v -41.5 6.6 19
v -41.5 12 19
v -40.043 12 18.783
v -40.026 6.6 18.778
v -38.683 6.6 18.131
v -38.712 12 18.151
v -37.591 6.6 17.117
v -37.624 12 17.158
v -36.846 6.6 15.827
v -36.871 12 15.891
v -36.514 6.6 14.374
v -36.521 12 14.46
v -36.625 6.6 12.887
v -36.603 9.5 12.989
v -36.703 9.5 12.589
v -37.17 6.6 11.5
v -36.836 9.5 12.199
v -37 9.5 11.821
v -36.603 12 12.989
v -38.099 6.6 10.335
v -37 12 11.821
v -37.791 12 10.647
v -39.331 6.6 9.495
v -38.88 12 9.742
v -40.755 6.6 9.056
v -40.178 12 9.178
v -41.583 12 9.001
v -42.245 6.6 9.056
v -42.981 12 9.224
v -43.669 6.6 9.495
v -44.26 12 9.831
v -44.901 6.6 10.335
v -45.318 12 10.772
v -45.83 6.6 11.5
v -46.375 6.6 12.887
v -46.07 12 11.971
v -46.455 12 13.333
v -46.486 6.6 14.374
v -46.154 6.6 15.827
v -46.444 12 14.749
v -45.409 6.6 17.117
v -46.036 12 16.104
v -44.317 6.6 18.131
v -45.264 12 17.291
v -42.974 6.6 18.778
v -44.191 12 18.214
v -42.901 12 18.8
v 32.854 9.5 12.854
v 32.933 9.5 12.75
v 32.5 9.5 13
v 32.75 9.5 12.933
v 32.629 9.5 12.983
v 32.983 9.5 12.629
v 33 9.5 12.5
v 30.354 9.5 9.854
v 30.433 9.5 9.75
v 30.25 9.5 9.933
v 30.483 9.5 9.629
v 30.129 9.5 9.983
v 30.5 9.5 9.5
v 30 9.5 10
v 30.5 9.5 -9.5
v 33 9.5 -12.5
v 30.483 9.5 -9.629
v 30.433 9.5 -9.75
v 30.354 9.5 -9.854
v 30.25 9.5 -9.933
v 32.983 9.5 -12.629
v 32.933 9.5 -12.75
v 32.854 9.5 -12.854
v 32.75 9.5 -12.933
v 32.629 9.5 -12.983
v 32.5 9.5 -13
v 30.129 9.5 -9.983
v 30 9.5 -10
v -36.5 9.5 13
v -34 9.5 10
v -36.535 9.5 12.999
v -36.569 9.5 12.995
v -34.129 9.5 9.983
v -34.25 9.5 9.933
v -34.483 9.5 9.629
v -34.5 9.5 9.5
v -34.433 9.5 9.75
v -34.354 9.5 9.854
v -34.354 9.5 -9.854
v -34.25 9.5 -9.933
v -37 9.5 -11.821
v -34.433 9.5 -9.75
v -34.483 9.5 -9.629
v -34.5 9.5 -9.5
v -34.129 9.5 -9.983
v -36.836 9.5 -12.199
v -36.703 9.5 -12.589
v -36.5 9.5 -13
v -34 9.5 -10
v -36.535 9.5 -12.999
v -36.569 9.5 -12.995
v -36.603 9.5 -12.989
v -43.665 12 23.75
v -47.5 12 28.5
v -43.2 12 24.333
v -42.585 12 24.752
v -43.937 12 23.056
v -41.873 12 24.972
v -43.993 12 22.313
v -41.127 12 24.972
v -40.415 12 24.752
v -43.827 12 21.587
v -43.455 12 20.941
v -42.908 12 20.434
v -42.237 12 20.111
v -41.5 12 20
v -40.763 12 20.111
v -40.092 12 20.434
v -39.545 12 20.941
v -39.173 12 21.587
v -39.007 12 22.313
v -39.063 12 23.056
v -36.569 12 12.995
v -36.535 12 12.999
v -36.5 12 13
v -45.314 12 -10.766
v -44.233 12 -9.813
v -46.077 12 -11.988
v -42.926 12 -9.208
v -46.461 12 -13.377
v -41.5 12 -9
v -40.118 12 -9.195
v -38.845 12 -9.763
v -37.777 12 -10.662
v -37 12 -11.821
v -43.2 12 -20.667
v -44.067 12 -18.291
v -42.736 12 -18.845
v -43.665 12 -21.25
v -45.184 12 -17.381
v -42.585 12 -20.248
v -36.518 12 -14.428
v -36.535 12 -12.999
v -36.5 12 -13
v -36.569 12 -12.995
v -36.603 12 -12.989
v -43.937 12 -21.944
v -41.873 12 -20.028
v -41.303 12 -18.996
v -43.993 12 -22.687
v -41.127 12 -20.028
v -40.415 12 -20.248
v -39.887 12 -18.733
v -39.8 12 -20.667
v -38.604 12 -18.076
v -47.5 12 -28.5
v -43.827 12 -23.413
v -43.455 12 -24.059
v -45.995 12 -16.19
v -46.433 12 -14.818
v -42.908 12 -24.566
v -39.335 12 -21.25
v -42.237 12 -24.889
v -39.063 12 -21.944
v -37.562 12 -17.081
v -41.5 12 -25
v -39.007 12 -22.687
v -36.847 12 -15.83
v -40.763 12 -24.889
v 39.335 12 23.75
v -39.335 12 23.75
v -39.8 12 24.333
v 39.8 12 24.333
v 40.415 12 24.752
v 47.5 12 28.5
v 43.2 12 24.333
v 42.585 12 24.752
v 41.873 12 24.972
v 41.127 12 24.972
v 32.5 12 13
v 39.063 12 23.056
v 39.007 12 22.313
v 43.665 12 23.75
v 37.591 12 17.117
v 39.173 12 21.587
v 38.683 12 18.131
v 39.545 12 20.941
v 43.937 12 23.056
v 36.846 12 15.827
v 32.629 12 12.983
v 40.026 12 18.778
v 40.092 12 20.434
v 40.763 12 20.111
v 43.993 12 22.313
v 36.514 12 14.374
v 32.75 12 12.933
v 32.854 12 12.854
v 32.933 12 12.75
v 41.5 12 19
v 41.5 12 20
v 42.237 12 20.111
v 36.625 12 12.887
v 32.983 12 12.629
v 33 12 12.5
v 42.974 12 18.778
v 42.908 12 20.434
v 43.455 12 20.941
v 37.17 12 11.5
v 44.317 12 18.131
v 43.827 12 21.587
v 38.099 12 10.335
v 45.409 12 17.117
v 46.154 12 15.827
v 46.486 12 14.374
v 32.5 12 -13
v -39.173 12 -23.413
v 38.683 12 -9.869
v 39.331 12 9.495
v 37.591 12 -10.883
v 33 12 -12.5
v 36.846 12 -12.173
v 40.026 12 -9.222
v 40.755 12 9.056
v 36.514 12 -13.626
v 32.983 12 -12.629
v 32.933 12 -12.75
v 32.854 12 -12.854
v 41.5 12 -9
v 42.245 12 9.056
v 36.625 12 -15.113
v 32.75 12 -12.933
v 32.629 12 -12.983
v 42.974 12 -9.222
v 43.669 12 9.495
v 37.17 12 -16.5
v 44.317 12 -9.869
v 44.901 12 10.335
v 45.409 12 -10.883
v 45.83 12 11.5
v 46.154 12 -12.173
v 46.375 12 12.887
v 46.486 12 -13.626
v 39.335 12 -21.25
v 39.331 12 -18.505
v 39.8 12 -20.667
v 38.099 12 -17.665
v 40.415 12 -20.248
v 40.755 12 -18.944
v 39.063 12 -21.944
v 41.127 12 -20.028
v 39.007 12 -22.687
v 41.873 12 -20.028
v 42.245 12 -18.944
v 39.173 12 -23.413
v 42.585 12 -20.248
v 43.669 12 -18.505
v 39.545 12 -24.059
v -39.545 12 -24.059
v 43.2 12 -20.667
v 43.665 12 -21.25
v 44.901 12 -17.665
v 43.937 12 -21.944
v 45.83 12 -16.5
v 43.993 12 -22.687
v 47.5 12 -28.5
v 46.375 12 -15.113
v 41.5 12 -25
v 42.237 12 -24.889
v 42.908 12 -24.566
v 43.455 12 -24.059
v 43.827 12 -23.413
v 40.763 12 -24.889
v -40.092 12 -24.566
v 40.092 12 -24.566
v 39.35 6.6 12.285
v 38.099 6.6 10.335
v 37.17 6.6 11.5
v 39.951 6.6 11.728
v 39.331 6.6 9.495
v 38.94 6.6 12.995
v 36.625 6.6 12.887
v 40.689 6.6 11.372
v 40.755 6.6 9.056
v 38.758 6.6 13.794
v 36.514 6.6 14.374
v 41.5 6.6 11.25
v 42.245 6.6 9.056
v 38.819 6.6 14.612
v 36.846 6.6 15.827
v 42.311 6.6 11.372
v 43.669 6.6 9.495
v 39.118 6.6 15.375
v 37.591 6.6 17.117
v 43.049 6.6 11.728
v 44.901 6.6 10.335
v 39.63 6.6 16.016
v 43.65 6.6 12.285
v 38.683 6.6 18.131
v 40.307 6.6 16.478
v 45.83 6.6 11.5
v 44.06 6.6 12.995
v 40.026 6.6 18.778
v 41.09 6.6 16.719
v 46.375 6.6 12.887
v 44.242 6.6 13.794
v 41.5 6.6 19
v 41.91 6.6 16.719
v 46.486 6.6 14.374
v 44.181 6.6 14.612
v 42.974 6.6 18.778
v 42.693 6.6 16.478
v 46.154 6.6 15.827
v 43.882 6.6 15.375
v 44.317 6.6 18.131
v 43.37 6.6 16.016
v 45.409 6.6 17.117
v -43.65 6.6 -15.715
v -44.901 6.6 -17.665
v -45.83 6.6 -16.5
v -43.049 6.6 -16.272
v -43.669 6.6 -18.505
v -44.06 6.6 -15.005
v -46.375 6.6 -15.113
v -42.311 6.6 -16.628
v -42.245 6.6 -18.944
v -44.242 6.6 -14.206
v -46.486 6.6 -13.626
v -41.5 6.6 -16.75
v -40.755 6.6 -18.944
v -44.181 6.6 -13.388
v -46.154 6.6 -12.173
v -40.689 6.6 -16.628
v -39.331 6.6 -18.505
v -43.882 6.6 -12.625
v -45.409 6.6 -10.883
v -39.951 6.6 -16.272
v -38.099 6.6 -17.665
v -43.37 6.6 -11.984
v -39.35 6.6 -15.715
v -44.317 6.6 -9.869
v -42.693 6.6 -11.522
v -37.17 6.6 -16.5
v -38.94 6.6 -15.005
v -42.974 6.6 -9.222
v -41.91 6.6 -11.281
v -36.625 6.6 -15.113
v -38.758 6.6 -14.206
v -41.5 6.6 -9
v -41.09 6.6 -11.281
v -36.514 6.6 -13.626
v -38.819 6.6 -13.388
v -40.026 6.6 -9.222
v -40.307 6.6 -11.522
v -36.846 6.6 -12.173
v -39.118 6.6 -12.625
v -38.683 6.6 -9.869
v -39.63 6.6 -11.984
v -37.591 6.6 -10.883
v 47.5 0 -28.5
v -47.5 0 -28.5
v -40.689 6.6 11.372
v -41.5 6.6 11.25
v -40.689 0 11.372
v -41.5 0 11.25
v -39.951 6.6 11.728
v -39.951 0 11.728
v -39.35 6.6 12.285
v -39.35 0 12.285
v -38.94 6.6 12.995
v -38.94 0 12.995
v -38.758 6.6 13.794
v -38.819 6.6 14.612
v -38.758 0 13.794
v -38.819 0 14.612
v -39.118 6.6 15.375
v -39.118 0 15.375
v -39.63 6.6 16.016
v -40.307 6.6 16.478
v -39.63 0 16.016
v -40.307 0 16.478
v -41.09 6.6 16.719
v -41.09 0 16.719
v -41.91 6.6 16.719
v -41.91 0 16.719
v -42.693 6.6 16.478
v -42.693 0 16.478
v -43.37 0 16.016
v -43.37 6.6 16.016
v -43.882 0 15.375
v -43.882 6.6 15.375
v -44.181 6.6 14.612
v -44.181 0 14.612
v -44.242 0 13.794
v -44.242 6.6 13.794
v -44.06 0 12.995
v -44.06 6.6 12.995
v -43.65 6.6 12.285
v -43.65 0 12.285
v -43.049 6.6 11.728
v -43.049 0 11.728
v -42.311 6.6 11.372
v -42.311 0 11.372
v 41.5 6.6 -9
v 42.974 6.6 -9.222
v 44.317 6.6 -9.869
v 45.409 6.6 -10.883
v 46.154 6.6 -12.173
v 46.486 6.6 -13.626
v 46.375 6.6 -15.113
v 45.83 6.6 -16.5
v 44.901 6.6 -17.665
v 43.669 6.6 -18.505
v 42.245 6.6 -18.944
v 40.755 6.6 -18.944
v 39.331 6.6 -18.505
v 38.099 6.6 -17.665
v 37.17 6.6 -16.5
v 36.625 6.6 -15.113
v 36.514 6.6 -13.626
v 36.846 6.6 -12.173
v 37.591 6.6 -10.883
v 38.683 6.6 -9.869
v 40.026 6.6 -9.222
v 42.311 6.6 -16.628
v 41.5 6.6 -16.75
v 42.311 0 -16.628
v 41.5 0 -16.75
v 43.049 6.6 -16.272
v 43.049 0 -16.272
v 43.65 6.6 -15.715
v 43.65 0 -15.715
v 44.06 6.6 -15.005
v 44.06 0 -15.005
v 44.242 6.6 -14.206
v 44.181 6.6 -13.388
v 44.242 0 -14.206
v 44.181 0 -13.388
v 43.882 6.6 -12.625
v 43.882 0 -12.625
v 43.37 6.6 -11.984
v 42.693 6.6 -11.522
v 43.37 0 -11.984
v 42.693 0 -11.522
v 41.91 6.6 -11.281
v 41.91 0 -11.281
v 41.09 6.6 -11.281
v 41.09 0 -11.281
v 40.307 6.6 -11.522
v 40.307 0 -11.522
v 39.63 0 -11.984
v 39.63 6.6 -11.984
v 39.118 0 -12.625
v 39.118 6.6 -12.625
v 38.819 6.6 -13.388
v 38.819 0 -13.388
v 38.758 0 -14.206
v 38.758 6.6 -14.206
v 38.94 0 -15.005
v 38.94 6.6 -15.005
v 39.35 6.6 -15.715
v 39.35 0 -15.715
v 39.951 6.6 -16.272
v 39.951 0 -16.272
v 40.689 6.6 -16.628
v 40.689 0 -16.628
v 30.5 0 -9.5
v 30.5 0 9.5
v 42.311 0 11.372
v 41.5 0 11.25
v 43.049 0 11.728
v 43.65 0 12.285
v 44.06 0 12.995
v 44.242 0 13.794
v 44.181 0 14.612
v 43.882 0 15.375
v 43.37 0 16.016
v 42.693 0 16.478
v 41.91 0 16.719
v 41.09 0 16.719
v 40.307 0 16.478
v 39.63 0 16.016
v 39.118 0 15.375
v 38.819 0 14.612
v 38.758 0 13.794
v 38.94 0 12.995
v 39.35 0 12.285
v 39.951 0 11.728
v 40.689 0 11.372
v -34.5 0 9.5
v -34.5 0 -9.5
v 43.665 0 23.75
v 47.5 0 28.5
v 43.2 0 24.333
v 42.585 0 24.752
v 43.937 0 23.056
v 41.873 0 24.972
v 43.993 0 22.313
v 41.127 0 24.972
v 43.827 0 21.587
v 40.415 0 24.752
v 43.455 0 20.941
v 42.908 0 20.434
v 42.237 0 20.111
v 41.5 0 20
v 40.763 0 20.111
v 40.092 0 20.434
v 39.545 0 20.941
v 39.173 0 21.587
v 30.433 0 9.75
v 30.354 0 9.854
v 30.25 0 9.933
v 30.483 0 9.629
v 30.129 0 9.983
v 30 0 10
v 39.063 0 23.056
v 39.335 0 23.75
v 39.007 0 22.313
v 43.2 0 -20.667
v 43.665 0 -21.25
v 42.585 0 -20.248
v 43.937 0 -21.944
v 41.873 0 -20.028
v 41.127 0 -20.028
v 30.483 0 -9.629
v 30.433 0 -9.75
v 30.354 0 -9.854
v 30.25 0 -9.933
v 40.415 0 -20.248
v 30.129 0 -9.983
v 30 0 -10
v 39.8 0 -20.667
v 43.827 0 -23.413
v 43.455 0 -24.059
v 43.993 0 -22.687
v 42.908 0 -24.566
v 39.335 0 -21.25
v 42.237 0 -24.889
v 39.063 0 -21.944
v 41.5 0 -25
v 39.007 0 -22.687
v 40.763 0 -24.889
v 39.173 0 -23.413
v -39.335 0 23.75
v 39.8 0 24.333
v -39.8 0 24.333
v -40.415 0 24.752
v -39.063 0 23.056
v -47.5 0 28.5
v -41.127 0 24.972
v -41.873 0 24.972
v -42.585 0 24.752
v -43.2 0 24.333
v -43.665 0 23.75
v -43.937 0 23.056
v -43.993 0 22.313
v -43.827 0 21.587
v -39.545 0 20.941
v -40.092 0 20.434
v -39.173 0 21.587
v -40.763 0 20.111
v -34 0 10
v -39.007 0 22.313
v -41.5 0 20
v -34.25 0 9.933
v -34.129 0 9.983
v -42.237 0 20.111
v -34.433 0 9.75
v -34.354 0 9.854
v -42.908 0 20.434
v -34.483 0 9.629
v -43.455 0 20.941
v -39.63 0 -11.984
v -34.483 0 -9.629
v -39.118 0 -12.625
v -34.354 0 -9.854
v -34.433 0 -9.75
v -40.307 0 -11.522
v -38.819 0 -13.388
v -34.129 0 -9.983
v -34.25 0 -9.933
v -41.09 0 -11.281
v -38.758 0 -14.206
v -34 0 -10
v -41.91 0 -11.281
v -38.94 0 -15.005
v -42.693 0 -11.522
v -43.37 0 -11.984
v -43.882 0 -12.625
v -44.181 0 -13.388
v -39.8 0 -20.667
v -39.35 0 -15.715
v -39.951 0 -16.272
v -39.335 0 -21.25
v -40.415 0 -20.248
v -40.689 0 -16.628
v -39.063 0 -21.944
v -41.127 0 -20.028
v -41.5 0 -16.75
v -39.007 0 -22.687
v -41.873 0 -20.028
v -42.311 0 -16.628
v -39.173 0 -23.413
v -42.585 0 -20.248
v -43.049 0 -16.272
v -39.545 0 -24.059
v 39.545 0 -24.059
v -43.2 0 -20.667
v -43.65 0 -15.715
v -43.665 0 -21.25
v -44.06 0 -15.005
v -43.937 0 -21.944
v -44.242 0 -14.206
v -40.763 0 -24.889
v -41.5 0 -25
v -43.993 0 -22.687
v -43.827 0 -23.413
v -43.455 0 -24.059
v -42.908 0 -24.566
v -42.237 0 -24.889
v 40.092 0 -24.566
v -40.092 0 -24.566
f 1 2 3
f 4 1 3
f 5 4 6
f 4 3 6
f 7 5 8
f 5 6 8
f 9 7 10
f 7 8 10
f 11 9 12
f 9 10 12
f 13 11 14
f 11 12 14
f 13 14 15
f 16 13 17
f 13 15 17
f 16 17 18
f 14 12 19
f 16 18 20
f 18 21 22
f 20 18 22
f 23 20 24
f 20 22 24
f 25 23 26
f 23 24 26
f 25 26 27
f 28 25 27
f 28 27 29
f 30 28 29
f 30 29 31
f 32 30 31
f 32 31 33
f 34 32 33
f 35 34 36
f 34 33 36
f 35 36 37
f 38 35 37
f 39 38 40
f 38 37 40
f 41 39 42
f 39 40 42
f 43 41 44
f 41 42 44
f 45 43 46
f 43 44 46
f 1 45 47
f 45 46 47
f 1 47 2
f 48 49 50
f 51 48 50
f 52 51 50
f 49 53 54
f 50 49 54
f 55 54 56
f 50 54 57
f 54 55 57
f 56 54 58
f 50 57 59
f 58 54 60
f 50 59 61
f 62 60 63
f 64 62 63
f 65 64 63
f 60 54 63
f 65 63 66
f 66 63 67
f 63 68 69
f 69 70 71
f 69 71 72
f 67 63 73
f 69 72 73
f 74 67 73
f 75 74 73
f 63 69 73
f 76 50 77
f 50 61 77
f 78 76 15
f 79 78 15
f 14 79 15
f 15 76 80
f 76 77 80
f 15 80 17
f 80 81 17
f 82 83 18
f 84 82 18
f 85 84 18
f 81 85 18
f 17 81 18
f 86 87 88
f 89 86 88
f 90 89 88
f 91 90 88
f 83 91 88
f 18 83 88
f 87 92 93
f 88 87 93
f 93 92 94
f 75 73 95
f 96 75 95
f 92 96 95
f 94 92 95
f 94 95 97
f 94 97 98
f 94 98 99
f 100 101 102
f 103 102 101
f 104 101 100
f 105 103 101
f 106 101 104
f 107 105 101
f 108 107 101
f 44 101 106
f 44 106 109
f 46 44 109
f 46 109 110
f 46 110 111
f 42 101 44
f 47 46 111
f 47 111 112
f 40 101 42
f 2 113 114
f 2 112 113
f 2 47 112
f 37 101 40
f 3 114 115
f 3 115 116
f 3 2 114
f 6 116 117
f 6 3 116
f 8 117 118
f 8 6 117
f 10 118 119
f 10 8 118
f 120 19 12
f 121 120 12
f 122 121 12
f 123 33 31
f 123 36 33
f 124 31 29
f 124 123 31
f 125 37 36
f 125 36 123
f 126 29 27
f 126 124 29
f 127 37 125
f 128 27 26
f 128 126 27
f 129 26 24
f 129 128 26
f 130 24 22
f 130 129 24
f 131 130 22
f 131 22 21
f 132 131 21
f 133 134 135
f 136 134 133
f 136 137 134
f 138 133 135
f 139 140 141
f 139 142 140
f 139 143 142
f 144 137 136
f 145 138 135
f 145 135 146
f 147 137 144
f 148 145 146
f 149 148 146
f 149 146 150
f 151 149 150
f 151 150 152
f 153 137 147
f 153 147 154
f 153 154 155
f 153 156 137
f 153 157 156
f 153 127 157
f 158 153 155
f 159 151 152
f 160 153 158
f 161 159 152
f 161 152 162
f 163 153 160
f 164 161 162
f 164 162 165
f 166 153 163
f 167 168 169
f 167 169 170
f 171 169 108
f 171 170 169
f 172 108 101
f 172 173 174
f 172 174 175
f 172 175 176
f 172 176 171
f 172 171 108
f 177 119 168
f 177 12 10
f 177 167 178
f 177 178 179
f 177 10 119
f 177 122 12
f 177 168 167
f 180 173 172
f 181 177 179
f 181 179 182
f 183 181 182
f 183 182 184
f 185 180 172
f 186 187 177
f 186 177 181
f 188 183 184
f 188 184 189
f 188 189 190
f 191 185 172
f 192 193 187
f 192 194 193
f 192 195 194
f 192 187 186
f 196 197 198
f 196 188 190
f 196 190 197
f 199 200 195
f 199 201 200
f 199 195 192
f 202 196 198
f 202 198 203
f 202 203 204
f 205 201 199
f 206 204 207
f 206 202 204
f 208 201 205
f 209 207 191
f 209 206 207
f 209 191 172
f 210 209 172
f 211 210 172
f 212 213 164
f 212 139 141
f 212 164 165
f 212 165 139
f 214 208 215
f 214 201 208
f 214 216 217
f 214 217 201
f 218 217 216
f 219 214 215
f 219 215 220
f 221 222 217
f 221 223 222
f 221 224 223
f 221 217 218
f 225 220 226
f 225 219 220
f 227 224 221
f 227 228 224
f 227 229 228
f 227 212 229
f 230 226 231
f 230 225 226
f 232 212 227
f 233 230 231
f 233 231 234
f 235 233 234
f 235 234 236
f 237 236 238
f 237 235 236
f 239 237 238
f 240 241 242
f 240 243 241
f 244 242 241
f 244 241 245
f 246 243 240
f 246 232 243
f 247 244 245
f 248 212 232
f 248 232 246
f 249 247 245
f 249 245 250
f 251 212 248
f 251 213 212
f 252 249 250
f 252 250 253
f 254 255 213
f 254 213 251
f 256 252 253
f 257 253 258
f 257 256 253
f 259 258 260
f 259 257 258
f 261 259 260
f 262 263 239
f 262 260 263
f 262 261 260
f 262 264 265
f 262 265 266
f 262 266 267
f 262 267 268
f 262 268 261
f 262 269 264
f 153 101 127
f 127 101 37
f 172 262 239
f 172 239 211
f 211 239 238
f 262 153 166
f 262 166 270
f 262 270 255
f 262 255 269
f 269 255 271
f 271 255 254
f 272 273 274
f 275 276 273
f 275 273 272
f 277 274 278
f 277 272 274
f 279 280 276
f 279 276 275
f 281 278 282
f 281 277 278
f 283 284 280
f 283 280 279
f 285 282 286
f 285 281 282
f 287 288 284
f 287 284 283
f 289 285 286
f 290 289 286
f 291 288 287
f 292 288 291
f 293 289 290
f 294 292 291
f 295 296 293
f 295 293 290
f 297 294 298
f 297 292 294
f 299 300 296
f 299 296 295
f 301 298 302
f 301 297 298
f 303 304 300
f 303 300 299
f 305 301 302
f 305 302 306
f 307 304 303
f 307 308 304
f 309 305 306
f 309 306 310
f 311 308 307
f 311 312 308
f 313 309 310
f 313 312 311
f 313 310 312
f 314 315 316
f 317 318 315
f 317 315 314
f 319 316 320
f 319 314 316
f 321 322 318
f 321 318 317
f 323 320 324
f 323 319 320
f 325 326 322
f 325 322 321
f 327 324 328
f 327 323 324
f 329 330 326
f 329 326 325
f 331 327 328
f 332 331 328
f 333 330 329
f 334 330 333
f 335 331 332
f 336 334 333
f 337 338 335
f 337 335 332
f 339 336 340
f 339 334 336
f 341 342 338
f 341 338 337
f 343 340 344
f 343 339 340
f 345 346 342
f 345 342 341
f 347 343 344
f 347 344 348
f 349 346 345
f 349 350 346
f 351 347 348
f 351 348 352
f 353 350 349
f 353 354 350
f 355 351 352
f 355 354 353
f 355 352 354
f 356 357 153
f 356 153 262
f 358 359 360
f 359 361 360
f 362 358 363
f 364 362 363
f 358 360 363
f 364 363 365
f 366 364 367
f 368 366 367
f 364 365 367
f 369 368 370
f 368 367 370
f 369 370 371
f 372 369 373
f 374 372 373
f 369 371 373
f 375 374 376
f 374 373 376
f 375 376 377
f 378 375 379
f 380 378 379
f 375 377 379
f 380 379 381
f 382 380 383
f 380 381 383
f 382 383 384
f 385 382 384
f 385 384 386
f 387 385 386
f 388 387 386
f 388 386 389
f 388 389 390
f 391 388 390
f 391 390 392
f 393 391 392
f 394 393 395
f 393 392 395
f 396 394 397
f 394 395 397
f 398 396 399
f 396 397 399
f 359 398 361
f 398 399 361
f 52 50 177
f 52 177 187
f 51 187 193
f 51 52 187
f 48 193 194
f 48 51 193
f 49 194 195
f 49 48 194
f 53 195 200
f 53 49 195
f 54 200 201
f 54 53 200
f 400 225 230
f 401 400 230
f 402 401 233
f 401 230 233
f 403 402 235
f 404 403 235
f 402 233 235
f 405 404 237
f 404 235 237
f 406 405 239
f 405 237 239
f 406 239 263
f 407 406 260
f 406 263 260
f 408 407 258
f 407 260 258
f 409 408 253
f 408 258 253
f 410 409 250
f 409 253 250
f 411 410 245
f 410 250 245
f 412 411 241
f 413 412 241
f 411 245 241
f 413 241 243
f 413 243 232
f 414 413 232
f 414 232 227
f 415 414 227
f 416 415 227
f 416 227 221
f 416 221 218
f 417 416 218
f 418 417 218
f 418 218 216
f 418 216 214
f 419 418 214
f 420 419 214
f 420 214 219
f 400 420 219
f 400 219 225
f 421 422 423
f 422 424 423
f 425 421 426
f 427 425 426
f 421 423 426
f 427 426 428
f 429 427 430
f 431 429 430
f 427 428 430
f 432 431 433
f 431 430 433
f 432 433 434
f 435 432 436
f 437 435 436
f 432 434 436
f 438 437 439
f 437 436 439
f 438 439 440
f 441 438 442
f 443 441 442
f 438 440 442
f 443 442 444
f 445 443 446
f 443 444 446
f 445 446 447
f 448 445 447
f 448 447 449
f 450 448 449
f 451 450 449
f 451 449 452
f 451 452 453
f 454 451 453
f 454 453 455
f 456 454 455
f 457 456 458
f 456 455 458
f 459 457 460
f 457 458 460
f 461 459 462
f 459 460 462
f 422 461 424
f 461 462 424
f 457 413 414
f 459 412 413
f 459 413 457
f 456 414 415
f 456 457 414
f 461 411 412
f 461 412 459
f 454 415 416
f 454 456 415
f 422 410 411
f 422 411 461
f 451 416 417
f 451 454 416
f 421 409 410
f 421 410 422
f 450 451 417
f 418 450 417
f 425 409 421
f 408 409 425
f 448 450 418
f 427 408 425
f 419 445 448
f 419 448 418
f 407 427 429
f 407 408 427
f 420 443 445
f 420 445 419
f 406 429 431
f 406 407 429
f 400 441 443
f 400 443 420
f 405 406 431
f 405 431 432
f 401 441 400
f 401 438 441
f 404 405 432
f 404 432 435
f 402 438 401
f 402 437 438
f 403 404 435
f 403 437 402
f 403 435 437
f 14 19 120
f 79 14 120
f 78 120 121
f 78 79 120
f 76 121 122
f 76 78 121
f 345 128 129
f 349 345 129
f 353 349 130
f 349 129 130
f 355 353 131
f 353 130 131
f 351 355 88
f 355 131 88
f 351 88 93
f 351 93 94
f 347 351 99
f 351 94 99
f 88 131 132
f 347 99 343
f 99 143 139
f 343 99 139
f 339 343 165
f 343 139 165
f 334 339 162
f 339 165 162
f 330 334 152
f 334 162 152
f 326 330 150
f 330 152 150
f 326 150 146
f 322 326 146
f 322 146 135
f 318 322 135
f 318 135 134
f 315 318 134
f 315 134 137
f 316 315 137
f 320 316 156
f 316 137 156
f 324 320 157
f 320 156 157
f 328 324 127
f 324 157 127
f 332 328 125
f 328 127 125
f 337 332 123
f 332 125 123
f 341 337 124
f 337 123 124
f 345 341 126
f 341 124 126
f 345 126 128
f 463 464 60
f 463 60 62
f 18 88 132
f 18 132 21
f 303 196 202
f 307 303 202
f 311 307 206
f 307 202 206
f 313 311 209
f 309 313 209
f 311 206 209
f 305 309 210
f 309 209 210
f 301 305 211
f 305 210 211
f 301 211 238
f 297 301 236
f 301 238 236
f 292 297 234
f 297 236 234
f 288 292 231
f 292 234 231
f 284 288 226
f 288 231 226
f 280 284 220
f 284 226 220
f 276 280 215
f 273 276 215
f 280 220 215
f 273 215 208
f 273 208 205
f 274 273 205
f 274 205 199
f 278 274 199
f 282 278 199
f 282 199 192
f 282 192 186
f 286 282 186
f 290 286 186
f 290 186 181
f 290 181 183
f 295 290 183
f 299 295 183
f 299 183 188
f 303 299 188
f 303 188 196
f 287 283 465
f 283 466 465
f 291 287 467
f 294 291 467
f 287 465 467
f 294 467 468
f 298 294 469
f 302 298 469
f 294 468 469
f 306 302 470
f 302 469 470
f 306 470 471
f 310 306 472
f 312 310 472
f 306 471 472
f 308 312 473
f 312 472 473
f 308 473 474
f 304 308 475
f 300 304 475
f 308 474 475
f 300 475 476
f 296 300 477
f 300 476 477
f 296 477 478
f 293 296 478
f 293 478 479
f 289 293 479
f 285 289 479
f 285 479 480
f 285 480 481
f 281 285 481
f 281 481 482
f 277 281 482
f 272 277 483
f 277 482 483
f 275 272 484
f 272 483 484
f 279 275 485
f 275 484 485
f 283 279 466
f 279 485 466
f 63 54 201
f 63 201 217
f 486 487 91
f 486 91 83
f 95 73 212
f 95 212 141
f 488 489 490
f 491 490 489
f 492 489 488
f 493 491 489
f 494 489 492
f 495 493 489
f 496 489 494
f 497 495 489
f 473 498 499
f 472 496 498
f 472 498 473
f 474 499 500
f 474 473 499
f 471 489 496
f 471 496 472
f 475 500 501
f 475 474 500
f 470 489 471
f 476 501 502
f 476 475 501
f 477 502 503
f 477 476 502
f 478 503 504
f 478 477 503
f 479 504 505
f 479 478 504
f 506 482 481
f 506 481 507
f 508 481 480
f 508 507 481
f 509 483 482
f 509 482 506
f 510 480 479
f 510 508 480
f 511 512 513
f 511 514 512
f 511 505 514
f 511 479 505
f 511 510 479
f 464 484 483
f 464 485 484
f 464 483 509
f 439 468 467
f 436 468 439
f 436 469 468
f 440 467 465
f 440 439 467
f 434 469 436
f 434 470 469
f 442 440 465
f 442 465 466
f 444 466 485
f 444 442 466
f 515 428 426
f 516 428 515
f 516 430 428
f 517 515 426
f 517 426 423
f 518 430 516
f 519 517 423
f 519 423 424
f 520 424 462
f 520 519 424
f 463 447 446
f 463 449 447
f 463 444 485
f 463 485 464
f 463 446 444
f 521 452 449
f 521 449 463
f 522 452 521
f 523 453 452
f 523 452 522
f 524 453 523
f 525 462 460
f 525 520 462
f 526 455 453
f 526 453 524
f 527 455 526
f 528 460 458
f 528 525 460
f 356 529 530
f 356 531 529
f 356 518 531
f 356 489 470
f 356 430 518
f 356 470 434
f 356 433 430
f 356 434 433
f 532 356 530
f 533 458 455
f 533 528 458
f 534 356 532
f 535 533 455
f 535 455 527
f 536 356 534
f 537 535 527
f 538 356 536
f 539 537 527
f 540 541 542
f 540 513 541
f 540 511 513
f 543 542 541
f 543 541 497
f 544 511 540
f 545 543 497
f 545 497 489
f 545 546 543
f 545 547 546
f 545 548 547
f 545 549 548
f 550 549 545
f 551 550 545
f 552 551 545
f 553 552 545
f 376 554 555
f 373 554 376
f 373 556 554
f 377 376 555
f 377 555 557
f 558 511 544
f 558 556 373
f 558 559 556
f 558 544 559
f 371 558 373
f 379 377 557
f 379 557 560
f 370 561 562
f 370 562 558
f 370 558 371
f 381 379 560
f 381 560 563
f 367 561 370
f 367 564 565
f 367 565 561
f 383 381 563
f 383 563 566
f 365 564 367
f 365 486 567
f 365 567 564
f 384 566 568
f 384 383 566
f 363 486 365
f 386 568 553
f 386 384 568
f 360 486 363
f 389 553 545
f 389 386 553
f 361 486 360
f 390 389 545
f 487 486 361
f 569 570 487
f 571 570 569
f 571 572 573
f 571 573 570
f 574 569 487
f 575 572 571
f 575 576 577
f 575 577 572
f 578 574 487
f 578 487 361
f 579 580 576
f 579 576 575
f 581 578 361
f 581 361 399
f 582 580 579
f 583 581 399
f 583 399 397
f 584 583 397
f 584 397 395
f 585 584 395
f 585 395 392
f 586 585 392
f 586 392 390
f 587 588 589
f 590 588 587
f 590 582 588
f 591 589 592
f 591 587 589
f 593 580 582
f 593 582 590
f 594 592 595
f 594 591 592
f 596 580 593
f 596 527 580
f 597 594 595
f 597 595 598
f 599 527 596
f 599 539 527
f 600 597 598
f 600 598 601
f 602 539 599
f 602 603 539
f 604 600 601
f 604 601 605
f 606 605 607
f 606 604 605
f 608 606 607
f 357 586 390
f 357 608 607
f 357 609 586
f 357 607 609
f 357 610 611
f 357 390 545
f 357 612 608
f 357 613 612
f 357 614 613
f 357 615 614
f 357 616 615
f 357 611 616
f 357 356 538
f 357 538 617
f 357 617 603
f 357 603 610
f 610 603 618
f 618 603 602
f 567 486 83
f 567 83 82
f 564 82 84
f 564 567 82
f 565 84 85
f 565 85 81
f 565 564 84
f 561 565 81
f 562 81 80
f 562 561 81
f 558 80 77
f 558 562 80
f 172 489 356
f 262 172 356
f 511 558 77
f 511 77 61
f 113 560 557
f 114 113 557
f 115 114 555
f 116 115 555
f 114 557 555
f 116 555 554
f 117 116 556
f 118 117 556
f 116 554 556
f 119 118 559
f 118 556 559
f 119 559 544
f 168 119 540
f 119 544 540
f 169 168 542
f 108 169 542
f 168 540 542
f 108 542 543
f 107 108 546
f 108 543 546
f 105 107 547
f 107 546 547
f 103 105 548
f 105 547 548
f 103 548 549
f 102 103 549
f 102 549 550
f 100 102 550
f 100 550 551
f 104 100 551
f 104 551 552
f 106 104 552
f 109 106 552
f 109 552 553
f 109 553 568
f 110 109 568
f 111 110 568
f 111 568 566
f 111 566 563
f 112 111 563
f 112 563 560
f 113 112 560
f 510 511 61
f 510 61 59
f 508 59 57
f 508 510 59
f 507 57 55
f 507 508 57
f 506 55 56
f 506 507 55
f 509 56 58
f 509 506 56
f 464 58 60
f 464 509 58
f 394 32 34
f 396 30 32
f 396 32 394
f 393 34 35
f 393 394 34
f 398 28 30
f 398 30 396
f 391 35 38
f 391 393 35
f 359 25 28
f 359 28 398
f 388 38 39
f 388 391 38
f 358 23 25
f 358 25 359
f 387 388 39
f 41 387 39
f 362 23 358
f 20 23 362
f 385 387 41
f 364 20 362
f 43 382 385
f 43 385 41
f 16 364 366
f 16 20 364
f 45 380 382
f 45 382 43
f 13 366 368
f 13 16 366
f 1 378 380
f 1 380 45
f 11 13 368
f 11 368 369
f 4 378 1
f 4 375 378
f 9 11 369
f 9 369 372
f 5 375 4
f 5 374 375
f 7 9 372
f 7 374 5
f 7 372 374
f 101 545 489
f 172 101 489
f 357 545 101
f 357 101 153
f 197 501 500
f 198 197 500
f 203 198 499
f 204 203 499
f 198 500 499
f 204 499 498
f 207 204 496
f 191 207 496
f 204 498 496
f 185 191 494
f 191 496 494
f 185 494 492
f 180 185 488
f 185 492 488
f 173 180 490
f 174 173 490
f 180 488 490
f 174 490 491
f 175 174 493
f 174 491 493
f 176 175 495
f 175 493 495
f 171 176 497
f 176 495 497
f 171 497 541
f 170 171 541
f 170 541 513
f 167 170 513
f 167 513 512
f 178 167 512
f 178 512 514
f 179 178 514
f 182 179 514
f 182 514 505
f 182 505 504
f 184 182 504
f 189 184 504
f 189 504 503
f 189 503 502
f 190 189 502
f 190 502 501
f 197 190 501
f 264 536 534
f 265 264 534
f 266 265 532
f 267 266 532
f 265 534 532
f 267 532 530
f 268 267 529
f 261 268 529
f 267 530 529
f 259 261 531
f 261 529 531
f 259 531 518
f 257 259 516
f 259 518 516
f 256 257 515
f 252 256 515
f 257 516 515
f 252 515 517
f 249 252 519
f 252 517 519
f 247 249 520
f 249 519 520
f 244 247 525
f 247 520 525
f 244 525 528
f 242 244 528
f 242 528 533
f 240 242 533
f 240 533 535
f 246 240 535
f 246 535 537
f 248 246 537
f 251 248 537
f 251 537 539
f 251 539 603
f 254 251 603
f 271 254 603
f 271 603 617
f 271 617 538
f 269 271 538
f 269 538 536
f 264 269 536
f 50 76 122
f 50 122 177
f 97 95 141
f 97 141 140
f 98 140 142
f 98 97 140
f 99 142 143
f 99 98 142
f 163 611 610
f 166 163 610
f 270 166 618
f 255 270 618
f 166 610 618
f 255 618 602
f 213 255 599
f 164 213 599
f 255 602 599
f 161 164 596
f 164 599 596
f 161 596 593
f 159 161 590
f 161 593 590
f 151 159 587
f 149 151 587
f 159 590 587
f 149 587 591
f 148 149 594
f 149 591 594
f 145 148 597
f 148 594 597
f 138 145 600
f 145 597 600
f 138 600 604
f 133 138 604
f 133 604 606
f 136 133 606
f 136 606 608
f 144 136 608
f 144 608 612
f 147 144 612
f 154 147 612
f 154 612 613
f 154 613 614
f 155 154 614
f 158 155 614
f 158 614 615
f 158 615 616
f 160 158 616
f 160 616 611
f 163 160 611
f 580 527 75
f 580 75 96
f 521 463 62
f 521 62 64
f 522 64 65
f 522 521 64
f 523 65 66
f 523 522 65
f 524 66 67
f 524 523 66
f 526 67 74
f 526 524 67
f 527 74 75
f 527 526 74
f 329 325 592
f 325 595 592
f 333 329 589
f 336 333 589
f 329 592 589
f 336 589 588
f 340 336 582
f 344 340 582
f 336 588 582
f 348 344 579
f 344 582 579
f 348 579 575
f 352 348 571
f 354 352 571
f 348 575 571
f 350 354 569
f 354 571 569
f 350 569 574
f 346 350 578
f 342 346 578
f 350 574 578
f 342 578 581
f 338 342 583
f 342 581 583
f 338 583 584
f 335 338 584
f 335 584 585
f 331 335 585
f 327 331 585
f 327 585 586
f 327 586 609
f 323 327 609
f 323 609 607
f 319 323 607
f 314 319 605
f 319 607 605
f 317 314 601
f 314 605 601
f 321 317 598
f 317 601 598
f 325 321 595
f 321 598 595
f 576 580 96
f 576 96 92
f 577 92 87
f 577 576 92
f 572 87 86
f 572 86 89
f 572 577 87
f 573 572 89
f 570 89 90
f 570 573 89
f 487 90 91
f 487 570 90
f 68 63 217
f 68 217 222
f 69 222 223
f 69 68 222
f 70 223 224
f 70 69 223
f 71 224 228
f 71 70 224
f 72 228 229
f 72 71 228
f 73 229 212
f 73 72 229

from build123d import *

# Parameters (mm, degrees)
SKETCH1_W                                   = 95
SKETCH1_H                                   = 57
SKETCH1_R                                   = 2.057983022
BOSS_EXTRUDE2_DEPTH                         = 12
BOSS_EXTRUDE3_DEPTH                         = 9.5
CBORE_FOR_M6_CHEESE_HEAD_SCREW1_D           = 5.5
CBORE_FOR_M6_CHEESE_HEAD_SCREW1_CBORE_D     = 10
CBORE_FOR_M6_CHEESE_HEAD_SCREW1_CBORE_DEPTH = 5.4
F_5_0_5_DIAMETER_HOLE1_D                    = 5


with BuildPart() as part:
    # Sketch1 → Boss-Extrude2 (new body)
    with BuildSketch(Plane(origin=(0, 0, 0), x_dir=(1, 0, 0), z_dir=(0, 1, 0))):
        Rectangle(SKETCH1_W, SKETCH1_H)
        with Locations((-41.5, -22.5)):
            Circle(SKETCH1_R, mode=Mode.SUBTRACT)
        with Locations((41.5, -22.5)):
            Circle(SKETCH1_R, mode=Mode.SUBTRACT)
        with BuildLine():
            Line((-36.5, 13), (32.5, 13))
            ThreePointArc((32.5, 13), (32.853553391, 12.853553391), (33, 12.5))
            Line((33, 12.5), (33, -12.5))
            ThreePointArc((33, -12.5), (32.853553391, -12.853553391), (32.5, -13))
            Line((32.5, -13), (-36.5, -13))
            ThreePointArc((-36.5, -13), (-36.853553391, -12.853553391), (-37, -12.5))
            Line((-37, -12.5), (-37, 12.5))
            ThreePointArc((-37, 12.5), (-36.853553391, 12.853553391), (-36.5, 13))
        make_face(mode=Mode.SUBTRACT)
        with Locations((-41.5, 22.5)):
            Circle(SKETCH1_R, mode=Mode.SUBTRACT)
        with Locations((41.5, 22.5)):
            Circle(SKETCH1_R, mode=Mode.SUBTRACT)
    extrude(amount=BOSS_EXTRUDE2_DEPTH)

    # Sketch1<5> → Boss-Extrude3 (add)
    with BuildSketch(Plane(origin=(0, 0, 0), x_dir=(1, 0, 0), z_dir=(0, 1, 0))):
        with BuildLine():
            ThreePointArc((33, 12.5), (32.853553391, 12.853553391), (32.5, 13))
            Line((32.5, 13), (-36.5, 13))
            ThreePointArc((-36.5, 13), (-36.853553391, 12.853553391), (-37, 12.5))
            Line((-37, 12.5), (-37, -12.5))
            ThreePointArc((-37, -12.5), (-36.853553391, -12.853553391), (-36.5, -13))
            Line((-36.5, -13), (32.5, -13))
            ThreePointArc((32.5, -13), (32.853553391, -12.853553391), (33, -12.5))
            Line((33, -12.5), (33, 12.5))
        make_face()
        with BuildLine():
            ThreePointArc((30.5, -9.5), (30.353553391, -9.853553391), (30, -10))
            Line((30, -10), (-34, -10))
            ThreePointArc((-34, -10), (-34.353553391, -9.853553391), (-34.5, -9.5))
            Line((-34.5, -9.5), (-34.5, 9.5))
            ThreePointArc((-34.5, 9.5), (-34.353553391, 9.853553391), (-34, 10))
            Line((-34, 10), (30, 10))
            ThreePointArc((30, 10), (30.353553391, 9.853553391), (30.5, 9.5))
            Line((30.5, 9.5), (30.5, -9.5))
        make_face(mode=Mode.SUBTRACT)
    extrude(amount=BOSS_EXTRUDE3_DEPTH)

    # CBORE for M6 Cheese Head Screw1 (through all)
    with Locations(Plane(origin=(-41.5, 12, -14), x_dir=(0, 0, 1), z_dir=(0, 1, 0))):
        with Locations((0, 0), (0, 83), (28, 83), (28, 0)):
            CounterBoreHole(CBORE_FOR_M6_CHEESE_HEAD_SCREW1_D / 2, CBORE_FOR_M6_CHEESE_HEAD_SCREW1_CBORE_D / 2, CBORE_FOR_M6_CHEESE_HEAD_SCREW1_CBORE_DEPTH)

    # Ø5.0 (5) Diameter Hole1 (through all)
    with Locations(Plane(origin=(-41.5, 12, -22.5), x_dir=(0, 0, 1), z_dir=(0, 1, 0))):
        with Locations((0, 0), (0, 83), (45, 83), (45, 0)):
            Hole(F_5_0_5_DIAMETER_HOLE1_D / 2)


solid = part.part
